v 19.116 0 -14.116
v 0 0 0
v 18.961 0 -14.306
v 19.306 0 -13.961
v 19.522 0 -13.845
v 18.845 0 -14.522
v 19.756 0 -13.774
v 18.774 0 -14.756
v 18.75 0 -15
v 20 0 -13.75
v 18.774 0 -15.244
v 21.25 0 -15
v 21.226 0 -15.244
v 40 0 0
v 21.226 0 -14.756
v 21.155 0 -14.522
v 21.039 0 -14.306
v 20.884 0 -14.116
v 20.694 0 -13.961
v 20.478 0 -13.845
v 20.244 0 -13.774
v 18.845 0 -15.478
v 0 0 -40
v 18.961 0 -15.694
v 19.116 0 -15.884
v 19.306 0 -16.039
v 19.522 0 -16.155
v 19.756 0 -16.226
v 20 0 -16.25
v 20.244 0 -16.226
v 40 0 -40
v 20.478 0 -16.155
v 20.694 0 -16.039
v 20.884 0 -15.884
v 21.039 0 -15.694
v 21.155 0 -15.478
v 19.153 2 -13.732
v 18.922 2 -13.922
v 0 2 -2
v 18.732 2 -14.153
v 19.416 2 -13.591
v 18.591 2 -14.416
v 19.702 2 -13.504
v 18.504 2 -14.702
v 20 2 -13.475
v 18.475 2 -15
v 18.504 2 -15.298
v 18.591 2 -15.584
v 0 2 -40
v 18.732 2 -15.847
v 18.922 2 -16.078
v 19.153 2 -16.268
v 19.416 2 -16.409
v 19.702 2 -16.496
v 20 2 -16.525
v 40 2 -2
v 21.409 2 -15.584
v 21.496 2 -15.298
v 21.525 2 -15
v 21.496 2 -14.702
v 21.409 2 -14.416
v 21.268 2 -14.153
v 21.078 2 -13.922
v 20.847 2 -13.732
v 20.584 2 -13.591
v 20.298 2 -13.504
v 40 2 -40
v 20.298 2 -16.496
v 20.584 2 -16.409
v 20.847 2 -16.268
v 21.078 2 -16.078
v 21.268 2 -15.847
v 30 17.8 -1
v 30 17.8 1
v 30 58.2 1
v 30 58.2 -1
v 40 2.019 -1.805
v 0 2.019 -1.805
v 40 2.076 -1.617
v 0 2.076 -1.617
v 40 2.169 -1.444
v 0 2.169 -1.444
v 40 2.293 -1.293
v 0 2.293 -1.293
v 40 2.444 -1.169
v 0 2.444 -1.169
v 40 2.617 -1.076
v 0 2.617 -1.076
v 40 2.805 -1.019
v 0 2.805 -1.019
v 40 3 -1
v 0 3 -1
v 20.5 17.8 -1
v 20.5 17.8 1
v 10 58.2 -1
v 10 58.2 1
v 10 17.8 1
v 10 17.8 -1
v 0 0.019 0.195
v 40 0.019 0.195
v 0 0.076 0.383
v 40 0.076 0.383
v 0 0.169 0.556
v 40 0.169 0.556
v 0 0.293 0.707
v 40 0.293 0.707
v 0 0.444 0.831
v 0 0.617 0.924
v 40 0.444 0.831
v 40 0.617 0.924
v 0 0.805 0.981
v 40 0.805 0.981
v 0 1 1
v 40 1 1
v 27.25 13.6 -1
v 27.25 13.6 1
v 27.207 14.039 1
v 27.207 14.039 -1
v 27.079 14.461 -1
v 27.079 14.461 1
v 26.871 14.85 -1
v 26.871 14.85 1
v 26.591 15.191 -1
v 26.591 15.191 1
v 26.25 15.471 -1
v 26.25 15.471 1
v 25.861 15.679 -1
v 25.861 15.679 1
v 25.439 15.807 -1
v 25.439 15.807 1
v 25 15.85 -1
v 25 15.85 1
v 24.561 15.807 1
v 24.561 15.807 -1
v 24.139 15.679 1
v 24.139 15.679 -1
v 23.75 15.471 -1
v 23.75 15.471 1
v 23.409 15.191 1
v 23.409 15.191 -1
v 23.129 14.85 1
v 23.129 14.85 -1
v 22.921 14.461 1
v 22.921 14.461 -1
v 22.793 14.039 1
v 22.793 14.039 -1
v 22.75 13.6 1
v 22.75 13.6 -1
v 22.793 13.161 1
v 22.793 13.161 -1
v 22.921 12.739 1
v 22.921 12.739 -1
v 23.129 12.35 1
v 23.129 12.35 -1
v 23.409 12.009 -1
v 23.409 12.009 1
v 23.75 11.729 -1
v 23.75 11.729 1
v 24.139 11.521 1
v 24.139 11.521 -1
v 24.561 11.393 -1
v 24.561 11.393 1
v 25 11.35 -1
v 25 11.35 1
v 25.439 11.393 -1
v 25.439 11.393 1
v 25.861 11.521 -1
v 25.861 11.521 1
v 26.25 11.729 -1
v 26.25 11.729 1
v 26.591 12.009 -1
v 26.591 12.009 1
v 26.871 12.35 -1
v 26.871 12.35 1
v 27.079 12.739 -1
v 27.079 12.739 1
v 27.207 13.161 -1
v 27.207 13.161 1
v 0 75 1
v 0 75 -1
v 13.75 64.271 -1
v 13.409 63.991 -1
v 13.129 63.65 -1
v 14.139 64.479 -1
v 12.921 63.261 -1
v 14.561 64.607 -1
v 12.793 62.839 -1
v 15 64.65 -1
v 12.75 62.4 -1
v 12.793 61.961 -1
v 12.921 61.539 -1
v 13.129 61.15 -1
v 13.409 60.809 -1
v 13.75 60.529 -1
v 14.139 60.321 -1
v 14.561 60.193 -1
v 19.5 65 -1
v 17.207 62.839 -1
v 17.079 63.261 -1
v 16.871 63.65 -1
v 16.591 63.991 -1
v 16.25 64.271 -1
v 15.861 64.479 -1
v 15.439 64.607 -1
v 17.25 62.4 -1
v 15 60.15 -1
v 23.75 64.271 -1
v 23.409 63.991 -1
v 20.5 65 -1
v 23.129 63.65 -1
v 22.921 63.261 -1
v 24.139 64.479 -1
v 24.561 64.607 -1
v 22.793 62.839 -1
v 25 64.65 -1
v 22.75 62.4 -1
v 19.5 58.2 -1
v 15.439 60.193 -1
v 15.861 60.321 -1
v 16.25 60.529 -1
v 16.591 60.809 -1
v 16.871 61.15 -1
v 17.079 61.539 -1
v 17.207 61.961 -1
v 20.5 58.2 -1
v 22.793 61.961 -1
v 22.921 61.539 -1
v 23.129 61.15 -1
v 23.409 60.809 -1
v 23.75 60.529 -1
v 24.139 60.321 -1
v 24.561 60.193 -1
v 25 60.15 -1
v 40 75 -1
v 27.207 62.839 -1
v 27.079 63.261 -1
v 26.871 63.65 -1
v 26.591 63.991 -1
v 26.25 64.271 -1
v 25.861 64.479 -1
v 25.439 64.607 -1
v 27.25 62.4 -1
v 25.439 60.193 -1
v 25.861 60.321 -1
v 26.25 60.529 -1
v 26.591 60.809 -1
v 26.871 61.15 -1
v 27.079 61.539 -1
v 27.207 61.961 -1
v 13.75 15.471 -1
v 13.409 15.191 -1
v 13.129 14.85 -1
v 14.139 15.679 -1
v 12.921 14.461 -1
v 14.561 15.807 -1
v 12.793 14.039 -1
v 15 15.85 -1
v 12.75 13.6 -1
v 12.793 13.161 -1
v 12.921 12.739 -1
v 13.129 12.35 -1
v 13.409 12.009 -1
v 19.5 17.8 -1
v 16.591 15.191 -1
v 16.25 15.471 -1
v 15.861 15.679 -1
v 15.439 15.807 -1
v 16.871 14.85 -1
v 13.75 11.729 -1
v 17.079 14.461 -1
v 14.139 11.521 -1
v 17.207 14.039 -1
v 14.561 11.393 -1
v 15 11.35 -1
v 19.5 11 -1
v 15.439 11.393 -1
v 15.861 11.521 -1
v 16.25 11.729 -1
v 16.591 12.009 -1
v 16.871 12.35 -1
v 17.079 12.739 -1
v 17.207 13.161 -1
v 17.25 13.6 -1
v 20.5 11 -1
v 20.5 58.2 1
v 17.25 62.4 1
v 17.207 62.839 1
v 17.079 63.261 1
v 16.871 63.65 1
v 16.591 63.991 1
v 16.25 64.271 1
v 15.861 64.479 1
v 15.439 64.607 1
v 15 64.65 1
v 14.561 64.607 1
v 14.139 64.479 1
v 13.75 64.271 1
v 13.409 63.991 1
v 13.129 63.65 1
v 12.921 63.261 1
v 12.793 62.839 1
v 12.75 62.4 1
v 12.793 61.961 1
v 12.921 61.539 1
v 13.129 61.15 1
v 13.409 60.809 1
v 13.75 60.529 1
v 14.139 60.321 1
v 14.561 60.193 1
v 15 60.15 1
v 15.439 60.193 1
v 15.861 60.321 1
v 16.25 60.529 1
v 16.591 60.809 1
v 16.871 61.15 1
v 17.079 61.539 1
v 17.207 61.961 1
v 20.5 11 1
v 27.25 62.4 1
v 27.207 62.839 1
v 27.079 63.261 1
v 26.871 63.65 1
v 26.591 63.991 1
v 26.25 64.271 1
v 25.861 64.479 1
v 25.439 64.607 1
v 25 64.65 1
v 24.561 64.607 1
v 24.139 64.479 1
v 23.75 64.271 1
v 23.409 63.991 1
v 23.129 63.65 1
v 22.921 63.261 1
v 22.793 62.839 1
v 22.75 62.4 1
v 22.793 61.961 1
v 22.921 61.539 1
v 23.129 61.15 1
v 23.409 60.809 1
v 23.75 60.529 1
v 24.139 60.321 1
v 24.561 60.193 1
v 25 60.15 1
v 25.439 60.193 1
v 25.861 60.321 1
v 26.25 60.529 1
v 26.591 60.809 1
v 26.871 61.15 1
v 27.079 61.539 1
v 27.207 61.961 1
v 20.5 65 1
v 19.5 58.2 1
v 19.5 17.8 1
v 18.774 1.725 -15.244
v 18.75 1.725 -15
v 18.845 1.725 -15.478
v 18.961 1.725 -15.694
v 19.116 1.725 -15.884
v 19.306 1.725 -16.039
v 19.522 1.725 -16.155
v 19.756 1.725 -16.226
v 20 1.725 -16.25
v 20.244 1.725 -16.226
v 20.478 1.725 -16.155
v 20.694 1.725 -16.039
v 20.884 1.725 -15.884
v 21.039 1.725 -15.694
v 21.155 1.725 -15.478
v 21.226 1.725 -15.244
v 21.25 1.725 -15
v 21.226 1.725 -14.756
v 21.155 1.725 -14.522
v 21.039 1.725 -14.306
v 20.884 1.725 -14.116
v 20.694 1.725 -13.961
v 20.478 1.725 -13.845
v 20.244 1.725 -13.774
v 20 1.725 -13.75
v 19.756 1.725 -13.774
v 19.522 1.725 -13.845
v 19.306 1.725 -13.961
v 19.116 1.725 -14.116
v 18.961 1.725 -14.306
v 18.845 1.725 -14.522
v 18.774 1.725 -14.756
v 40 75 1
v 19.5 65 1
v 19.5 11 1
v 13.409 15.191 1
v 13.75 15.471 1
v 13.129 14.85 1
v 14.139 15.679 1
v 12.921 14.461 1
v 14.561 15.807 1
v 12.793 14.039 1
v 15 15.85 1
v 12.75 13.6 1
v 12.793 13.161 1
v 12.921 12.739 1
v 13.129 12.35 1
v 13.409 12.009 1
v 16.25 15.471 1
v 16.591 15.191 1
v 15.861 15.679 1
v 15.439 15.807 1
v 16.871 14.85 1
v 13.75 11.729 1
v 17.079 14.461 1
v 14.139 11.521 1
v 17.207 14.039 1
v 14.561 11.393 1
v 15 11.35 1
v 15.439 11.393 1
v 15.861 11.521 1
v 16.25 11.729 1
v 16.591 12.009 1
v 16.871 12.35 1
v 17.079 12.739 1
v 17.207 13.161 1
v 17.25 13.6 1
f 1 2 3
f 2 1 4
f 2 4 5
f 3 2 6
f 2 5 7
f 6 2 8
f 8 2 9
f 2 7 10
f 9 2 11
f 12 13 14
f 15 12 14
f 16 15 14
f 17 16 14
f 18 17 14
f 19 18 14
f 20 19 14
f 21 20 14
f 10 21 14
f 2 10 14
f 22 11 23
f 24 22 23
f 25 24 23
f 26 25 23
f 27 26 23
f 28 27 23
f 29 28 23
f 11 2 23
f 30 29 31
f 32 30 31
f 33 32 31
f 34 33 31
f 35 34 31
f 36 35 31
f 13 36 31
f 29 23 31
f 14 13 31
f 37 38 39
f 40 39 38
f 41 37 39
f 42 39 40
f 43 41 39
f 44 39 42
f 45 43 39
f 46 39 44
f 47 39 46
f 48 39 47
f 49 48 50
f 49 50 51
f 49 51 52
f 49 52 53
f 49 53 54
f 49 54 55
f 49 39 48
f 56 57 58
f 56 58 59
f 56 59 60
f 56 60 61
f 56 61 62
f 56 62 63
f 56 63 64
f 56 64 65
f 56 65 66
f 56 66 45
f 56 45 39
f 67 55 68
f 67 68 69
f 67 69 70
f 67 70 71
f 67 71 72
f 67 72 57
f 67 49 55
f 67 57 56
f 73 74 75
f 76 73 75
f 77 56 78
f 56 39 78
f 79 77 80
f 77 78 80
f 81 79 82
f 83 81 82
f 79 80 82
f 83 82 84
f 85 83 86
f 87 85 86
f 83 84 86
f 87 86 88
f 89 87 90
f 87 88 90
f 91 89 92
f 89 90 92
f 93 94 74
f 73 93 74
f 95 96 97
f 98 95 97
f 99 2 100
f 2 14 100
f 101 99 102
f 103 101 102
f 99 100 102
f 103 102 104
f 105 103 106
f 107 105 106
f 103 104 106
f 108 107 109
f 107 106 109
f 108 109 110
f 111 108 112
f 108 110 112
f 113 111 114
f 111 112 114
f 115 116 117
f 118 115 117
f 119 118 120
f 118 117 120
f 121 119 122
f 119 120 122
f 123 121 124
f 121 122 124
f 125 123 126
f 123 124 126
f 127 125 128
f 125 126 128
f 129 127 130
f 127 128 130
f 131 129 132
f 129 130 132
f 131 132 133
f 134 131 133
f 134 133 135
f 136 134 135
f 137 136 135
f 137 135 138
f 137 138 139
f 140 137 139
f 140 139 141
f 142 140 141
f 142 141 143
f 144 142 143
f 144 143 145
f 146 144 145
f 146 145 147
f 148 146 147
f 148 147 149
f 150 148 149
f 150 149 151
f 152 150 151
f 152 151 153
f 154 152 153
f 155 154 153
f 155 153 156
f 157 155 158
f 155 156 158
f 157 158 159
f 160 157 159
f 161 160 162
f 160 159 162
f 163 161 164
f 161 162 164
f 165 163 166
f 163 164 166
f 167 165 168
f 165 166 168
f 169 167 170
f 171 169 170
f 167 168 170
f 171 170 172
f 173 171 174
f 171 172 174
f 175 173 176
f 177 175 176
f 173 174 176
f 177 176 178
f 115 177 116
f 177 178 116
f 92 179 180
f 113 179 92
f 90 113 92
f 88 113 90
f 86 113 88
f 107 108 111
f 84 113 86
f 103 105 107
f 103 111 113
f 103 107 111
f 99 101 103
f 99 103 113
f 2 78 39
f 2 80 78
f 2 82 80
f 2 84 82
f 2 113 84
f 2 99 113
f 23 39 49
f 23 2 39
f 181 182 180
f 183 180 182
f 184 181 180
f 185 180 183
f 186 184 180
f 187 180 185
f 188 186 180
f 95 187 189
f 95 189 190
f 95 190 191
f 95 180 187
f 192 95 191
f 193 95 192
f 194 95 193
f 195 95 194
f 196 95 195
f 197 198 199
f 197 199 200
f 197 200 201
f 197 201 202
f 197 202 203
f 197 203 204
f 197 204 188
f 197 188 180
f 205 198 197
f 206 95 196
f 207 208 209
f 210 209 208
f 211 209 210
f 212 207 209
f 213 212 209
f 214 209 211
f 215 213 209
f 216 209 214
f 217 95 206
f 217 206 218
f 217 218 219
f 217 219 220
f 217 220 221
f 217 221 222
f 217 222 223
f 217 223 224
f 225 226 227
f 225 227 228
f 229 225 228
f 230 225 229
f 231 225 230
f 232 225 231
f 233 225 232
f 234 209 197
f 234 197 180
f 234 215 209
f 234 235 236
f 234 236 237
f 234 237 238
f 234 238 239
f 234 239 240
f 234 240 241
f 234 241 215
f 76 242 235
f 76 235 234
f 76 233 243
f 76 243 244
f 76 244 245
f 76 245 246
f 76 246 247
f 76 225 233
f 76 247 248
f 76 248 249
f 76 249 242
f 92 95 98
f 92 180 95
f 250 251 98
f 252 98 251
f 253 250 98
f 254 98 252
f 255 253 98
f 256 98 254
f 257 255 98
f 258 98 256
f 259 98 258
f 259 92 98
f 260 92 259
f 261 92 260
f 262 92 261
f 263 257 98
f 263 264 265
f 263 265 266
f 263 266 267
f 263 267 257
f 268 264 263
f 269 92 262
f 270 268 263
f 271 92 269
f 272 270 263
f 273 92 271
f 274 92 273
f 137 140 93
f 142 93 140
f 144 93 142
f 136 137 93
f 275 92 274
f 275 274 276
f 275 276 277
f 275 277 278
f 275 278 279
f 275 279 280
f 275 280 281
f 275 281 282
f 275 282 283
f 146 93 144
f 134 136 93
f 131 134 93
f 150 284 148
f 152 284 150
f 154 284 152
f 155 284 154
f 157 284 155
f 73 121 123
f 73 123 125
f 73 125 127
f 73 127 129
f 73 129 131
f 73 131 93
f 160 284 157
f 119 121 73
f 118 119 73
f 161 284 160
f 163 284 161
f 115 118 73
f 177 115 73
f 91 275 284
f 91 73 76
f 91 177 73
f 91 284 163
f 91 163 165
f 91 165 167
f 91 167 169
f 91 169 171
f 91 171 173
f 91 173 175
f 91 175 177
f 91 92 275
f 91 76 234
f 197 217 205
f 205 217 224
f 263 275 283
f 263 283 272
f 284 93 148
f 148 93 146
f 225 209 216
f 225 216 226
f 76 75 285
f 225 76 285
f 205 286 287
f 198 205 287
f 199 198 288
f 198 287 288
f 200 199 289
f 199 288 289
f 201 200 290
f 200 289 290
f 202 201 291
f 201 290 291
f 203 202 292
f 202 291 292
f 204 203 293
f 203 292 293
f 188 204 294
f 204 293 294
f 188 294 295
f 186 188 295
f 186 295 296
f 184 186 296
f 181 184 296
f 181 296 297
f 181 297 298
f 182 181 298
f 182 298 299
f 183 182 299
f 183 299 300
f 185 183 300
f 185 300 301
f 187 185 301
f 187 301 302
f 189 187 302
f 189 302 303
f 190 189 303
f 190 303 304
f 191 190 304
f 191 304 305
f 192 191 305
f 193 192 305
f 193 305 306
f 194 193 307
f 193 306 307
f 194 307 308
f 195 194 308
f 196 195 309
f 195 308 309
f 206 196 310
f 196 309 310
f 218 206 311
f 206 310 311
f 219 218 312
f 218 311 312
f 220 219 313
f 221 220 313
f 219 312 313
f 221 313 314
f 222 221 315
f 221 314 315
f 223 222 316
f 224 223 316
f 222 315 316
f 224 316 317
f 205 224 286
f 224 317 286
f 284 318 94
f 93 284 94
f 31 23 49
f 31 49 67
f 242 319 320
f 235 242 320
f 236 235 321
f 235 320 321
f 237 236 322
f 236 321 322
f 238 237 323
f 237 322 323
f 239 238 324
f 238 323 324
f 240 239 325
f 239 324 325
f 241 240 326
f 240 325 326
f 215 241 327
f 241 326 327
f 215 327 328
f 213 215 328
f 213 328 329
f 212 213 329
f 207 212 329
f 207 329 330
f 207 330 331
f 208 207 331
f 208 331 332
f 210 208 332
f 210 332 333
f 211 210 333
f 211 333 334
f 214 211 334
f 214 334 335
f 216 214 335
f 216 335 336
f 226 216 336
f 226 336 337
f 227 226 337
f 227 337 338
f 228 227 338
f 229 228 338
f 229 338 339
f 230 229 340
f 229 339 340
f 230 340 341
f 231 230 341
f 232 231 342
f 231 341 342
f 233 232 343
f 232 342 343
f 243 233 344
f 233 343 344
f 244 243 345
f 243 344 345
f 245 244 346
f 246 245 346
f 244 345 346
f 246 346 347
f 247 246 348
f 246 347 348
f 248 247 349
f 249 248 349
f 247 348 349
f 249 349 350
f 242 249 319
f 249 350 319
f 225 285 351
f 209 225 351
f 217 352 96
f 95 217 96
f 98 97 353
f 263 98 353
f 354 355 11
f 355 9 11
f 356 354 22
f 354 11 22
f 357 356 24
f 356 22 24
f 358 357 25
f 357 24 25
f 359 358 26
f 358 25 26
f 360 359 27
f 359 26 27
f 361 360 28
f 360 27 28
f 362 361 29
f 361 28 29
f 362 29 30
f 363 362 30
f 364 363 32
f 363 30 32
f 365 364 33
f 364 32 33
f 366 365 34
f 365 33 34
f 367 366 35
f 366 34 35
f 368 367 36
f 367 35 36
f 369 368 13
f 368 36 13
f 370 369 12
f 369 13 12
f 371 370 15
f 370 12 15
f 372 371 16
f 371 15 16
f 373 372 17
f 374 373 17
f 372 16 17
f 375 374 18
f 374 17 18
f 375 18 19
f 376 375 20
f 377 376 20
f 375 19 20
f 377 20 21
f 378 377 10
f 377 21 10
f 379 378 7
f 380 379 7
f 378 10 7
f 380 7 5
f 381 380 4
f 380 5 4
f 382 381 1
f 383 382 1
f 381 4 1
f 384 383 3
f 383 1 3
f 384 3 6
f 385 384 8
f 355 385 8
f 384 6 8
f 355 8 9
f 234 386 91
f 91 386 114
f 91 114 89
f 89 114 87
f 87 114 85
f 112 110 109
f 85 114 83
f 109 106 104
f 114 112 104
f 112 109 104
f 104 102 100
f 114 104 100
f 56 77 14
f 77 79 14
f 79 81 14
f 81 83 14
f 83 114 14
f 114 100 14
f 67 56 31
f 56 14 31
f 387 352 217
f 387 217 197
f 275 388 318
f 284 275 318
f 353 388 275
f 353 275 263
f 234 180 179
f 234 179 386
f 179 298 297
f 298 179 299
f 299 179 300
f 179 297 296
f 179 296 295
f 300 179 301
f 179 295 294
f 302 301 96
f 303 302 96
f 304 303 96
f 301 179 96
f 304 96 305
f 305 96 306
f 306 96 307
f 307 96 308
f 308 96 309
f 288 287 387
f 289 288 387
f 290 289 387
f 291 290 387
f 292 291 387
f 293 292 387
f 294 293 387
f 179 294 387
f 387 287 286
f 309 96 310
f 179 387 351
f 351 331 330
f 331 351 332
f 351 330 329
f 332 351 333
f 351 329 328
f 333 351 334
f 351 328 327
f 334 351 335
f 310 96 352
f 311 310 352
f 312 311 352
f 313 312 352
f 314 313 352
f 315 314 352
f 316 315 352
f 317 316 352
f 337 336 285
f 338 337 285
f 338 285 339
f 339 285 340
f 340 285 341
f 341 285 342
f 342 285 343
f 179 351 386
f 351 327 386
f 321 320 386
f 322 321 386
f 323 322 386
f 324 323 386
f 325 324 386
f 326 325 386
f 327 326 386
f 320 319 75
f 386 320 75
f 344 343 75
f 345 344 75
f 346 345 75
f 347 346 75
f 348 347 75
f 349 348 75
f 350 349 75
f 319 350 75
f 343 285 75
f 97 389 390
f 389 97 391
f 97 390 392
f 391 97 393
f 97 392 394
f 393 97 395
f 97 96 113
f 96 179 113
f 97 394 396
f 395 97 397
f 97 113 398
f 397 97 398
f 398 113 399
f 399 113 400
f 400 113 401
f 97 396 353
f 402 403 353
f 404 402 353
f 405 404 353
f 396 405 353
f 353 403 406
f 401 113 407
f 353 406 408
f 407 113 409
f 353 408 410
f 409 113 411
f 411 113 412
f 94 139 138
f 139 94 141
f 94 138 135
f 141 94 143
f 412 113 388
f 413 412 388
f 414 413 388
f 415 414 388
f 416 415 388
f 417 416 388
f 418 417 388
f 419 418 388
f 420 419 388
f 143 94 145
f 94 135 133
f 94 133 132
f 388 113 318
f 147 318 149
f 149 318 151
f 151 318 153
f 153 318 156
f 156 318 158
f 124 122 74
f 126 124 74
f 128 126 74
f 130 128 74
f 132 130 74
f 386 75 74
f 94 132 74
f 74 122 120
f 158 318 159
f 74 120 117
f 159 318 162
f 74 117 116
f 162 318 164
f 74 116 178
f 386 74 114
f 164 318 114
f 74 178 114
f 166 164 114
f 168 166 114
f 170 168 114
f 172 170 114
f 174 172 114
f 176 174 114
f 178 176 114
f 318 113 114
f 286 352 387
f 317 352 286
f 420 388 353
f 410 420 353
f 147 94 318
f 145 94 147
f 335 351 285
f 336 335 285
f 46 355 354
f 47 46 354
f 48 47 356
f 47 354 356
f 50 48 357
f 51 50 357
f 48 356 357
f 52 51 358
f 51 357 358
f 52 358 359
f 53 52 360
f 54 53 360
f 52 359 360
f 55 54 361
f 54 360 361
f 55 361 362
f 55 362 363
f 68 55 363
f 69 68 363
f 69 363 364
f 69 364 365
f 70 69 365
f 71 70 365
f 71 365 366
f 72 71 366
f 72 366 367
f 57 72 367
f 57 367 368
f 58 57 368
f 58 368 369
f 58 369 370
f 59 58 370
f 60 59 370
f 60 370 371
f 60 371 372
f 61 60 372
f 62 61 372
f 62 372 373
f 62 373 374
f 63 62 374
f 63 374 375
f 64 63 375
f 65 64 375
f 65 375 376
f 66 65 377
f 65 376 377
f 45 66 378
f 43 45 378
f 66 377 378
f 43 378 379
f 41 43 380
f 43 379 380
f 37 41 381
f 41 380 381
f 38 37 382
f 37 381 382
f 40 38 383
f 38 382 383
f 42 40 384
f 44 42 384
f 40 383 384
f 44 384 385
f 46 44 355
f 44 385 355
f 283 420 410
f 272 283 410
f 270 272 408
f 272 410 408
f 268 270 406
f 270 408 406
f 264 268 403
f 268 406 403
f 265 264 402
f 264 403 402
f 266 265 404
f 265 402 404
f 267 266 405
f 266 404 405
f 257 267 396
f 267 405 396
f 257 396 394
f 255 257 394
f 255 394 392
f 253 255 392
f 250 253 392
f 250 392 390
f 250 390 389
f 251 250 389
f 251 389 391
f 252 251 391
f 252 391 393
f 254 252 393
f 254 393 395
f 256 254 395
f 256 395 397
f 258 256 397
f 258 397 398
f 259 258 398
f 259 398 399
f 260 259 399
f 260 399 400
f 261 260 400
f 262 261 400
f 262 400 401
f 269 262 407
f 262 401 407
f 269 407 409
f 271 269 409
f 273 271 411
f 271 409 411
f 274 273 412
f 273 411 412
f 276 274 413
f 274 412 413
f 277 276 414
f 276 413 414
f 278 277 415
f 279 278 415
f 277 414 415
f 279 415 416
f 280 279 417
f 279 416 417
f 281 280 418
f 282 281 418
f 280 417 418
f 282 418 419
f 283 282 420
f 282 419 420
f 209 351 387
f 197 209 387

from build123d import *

# Parameters (mm, degrees)
SKETCH1_W                   = 40
SKETCH1_H                   = 40
BOSS_EXTRUDE1_DEPTH         = 2
BOSS_EXTRUDE2_DEPTH         = 73
BOSS_EXTRUDE2_DEPTH_BACK    = 2
SKETCH2_W                   = 40
SKETCH2_H                   = 1
FILLET1_R                   = 1
SKETCH4_R                   = 2.25
SKETCH4_W                   = 0.5
SKETCH4_H                   = 6.8
CUT_EXTRUDE1_DEPTH          = 49
M3_TAPPED_HOLE1_D           = 2.5
M3_TAPPED_HOLE1_CSINK_D     = 3.05
M3_TAPPED_HOLE1_CSINK_ANGLE = 90


with BuildPart() as part:
    # Sketch1 → Boss-Extrude1 (new body)
    with BuildSketch(Plane(origin=(0, 0, 0), x_dir=(1, 0, 0), z_dir=(0, 1, 0))):
        with Locations((20, 20)):
            Rectangle(SKETCH1_W, SKETCH1_H)
    extrude(amount=BOSS_EXTRUDE1_DEPTH)

    # Sketch2 → Boss-Extrude2 (add, two sides: drawn at the far end of the back side and taken through both)
    with BuildSketch(Plane(origin=(0, 2, 0), x_dir=(1, 0, 0), z_dir=(0, 1, 0)).offset(-BOSS_EXTRUDE2_DEPTH_BACK)):
        with Locations((20, 0.5)):
            Rectangle(SKETCH2_W, SKETCH2_H)
        with Locations((20, -0.5)):
            Rectangle(SKETCH2_W, SKETCH2_H)
    extrude(amount=BOSS_EXTRUDE2_DEPTH + BOSS_EXTRUDE2_DEPTH_BACK)

    # Fillet1
    fillet1_edges = [part.edges().sort_by_distance(p)[0] for p in [
        (20, 2, -1),
        (20, 0, 1),
    ]]
    fillet(fillet1_edges, radius=FILLET1_R)

    # Sketch4 → Cut-Extrude1 (cut)
    with BuildSketch(Plane.XY.offset(1)):
        with Locations((15, 62.4)):
            Circle(SKETCH4_R)
        with Locations((19.75, 61.6)):
            Rectangle(SKETCH4_W, SKETCH4_H)
        with Locations((20.25, 61.6)):
            Rectangle(SKETCH4_W, SKETCH4_H)
        with Locations((25, 62.4)):
            Circle(SKETCH4_R)
        Polygon((20.5, 58.2), (20, 58.2), (20, 17.8), (20.5, 17.8), (30, 17.8), (30, 58.2), align=None)
        Polygon((20, 17.8), (20, 58.2), (19.5, 58.2), (10, 58.2), (10, 17.8), (19.5, 17.8), align=None)
        with Locations((19.75, 14.4)):
            Rectangle(SKETCH4_W, SKETCH4_H)
        with Locations((15, 13.6)):
            Circle(SKETCH4_R)
        with Locations((20.25, 14.4)):
            Rectangle(SKETCH4_W, SKETCH4_H)
        with Locations((25, 13.6)):
            Circle(SKETCH4_R)
    extrude(amount=-CUT_EXTRUDE1_DEPTH, mode=Mode.SUBTRACT)

    # M3 Tapped Hole1 (through all)
    with Locations(Plane(origin=(0, 2, 0), x_dir=(1, 0, 0), z_dir=(0, 1, 0))):
        with Locations((20, 15)):
            CounterSinkHole(M3_TAPPED_HOLE1_D / 2, M3_TAPPED_HOLE1_CSINK_D / 2, counter_sink_angle=M3_TAPPED_HOLE1_CSINK_ANGLE)


solid = part.part
